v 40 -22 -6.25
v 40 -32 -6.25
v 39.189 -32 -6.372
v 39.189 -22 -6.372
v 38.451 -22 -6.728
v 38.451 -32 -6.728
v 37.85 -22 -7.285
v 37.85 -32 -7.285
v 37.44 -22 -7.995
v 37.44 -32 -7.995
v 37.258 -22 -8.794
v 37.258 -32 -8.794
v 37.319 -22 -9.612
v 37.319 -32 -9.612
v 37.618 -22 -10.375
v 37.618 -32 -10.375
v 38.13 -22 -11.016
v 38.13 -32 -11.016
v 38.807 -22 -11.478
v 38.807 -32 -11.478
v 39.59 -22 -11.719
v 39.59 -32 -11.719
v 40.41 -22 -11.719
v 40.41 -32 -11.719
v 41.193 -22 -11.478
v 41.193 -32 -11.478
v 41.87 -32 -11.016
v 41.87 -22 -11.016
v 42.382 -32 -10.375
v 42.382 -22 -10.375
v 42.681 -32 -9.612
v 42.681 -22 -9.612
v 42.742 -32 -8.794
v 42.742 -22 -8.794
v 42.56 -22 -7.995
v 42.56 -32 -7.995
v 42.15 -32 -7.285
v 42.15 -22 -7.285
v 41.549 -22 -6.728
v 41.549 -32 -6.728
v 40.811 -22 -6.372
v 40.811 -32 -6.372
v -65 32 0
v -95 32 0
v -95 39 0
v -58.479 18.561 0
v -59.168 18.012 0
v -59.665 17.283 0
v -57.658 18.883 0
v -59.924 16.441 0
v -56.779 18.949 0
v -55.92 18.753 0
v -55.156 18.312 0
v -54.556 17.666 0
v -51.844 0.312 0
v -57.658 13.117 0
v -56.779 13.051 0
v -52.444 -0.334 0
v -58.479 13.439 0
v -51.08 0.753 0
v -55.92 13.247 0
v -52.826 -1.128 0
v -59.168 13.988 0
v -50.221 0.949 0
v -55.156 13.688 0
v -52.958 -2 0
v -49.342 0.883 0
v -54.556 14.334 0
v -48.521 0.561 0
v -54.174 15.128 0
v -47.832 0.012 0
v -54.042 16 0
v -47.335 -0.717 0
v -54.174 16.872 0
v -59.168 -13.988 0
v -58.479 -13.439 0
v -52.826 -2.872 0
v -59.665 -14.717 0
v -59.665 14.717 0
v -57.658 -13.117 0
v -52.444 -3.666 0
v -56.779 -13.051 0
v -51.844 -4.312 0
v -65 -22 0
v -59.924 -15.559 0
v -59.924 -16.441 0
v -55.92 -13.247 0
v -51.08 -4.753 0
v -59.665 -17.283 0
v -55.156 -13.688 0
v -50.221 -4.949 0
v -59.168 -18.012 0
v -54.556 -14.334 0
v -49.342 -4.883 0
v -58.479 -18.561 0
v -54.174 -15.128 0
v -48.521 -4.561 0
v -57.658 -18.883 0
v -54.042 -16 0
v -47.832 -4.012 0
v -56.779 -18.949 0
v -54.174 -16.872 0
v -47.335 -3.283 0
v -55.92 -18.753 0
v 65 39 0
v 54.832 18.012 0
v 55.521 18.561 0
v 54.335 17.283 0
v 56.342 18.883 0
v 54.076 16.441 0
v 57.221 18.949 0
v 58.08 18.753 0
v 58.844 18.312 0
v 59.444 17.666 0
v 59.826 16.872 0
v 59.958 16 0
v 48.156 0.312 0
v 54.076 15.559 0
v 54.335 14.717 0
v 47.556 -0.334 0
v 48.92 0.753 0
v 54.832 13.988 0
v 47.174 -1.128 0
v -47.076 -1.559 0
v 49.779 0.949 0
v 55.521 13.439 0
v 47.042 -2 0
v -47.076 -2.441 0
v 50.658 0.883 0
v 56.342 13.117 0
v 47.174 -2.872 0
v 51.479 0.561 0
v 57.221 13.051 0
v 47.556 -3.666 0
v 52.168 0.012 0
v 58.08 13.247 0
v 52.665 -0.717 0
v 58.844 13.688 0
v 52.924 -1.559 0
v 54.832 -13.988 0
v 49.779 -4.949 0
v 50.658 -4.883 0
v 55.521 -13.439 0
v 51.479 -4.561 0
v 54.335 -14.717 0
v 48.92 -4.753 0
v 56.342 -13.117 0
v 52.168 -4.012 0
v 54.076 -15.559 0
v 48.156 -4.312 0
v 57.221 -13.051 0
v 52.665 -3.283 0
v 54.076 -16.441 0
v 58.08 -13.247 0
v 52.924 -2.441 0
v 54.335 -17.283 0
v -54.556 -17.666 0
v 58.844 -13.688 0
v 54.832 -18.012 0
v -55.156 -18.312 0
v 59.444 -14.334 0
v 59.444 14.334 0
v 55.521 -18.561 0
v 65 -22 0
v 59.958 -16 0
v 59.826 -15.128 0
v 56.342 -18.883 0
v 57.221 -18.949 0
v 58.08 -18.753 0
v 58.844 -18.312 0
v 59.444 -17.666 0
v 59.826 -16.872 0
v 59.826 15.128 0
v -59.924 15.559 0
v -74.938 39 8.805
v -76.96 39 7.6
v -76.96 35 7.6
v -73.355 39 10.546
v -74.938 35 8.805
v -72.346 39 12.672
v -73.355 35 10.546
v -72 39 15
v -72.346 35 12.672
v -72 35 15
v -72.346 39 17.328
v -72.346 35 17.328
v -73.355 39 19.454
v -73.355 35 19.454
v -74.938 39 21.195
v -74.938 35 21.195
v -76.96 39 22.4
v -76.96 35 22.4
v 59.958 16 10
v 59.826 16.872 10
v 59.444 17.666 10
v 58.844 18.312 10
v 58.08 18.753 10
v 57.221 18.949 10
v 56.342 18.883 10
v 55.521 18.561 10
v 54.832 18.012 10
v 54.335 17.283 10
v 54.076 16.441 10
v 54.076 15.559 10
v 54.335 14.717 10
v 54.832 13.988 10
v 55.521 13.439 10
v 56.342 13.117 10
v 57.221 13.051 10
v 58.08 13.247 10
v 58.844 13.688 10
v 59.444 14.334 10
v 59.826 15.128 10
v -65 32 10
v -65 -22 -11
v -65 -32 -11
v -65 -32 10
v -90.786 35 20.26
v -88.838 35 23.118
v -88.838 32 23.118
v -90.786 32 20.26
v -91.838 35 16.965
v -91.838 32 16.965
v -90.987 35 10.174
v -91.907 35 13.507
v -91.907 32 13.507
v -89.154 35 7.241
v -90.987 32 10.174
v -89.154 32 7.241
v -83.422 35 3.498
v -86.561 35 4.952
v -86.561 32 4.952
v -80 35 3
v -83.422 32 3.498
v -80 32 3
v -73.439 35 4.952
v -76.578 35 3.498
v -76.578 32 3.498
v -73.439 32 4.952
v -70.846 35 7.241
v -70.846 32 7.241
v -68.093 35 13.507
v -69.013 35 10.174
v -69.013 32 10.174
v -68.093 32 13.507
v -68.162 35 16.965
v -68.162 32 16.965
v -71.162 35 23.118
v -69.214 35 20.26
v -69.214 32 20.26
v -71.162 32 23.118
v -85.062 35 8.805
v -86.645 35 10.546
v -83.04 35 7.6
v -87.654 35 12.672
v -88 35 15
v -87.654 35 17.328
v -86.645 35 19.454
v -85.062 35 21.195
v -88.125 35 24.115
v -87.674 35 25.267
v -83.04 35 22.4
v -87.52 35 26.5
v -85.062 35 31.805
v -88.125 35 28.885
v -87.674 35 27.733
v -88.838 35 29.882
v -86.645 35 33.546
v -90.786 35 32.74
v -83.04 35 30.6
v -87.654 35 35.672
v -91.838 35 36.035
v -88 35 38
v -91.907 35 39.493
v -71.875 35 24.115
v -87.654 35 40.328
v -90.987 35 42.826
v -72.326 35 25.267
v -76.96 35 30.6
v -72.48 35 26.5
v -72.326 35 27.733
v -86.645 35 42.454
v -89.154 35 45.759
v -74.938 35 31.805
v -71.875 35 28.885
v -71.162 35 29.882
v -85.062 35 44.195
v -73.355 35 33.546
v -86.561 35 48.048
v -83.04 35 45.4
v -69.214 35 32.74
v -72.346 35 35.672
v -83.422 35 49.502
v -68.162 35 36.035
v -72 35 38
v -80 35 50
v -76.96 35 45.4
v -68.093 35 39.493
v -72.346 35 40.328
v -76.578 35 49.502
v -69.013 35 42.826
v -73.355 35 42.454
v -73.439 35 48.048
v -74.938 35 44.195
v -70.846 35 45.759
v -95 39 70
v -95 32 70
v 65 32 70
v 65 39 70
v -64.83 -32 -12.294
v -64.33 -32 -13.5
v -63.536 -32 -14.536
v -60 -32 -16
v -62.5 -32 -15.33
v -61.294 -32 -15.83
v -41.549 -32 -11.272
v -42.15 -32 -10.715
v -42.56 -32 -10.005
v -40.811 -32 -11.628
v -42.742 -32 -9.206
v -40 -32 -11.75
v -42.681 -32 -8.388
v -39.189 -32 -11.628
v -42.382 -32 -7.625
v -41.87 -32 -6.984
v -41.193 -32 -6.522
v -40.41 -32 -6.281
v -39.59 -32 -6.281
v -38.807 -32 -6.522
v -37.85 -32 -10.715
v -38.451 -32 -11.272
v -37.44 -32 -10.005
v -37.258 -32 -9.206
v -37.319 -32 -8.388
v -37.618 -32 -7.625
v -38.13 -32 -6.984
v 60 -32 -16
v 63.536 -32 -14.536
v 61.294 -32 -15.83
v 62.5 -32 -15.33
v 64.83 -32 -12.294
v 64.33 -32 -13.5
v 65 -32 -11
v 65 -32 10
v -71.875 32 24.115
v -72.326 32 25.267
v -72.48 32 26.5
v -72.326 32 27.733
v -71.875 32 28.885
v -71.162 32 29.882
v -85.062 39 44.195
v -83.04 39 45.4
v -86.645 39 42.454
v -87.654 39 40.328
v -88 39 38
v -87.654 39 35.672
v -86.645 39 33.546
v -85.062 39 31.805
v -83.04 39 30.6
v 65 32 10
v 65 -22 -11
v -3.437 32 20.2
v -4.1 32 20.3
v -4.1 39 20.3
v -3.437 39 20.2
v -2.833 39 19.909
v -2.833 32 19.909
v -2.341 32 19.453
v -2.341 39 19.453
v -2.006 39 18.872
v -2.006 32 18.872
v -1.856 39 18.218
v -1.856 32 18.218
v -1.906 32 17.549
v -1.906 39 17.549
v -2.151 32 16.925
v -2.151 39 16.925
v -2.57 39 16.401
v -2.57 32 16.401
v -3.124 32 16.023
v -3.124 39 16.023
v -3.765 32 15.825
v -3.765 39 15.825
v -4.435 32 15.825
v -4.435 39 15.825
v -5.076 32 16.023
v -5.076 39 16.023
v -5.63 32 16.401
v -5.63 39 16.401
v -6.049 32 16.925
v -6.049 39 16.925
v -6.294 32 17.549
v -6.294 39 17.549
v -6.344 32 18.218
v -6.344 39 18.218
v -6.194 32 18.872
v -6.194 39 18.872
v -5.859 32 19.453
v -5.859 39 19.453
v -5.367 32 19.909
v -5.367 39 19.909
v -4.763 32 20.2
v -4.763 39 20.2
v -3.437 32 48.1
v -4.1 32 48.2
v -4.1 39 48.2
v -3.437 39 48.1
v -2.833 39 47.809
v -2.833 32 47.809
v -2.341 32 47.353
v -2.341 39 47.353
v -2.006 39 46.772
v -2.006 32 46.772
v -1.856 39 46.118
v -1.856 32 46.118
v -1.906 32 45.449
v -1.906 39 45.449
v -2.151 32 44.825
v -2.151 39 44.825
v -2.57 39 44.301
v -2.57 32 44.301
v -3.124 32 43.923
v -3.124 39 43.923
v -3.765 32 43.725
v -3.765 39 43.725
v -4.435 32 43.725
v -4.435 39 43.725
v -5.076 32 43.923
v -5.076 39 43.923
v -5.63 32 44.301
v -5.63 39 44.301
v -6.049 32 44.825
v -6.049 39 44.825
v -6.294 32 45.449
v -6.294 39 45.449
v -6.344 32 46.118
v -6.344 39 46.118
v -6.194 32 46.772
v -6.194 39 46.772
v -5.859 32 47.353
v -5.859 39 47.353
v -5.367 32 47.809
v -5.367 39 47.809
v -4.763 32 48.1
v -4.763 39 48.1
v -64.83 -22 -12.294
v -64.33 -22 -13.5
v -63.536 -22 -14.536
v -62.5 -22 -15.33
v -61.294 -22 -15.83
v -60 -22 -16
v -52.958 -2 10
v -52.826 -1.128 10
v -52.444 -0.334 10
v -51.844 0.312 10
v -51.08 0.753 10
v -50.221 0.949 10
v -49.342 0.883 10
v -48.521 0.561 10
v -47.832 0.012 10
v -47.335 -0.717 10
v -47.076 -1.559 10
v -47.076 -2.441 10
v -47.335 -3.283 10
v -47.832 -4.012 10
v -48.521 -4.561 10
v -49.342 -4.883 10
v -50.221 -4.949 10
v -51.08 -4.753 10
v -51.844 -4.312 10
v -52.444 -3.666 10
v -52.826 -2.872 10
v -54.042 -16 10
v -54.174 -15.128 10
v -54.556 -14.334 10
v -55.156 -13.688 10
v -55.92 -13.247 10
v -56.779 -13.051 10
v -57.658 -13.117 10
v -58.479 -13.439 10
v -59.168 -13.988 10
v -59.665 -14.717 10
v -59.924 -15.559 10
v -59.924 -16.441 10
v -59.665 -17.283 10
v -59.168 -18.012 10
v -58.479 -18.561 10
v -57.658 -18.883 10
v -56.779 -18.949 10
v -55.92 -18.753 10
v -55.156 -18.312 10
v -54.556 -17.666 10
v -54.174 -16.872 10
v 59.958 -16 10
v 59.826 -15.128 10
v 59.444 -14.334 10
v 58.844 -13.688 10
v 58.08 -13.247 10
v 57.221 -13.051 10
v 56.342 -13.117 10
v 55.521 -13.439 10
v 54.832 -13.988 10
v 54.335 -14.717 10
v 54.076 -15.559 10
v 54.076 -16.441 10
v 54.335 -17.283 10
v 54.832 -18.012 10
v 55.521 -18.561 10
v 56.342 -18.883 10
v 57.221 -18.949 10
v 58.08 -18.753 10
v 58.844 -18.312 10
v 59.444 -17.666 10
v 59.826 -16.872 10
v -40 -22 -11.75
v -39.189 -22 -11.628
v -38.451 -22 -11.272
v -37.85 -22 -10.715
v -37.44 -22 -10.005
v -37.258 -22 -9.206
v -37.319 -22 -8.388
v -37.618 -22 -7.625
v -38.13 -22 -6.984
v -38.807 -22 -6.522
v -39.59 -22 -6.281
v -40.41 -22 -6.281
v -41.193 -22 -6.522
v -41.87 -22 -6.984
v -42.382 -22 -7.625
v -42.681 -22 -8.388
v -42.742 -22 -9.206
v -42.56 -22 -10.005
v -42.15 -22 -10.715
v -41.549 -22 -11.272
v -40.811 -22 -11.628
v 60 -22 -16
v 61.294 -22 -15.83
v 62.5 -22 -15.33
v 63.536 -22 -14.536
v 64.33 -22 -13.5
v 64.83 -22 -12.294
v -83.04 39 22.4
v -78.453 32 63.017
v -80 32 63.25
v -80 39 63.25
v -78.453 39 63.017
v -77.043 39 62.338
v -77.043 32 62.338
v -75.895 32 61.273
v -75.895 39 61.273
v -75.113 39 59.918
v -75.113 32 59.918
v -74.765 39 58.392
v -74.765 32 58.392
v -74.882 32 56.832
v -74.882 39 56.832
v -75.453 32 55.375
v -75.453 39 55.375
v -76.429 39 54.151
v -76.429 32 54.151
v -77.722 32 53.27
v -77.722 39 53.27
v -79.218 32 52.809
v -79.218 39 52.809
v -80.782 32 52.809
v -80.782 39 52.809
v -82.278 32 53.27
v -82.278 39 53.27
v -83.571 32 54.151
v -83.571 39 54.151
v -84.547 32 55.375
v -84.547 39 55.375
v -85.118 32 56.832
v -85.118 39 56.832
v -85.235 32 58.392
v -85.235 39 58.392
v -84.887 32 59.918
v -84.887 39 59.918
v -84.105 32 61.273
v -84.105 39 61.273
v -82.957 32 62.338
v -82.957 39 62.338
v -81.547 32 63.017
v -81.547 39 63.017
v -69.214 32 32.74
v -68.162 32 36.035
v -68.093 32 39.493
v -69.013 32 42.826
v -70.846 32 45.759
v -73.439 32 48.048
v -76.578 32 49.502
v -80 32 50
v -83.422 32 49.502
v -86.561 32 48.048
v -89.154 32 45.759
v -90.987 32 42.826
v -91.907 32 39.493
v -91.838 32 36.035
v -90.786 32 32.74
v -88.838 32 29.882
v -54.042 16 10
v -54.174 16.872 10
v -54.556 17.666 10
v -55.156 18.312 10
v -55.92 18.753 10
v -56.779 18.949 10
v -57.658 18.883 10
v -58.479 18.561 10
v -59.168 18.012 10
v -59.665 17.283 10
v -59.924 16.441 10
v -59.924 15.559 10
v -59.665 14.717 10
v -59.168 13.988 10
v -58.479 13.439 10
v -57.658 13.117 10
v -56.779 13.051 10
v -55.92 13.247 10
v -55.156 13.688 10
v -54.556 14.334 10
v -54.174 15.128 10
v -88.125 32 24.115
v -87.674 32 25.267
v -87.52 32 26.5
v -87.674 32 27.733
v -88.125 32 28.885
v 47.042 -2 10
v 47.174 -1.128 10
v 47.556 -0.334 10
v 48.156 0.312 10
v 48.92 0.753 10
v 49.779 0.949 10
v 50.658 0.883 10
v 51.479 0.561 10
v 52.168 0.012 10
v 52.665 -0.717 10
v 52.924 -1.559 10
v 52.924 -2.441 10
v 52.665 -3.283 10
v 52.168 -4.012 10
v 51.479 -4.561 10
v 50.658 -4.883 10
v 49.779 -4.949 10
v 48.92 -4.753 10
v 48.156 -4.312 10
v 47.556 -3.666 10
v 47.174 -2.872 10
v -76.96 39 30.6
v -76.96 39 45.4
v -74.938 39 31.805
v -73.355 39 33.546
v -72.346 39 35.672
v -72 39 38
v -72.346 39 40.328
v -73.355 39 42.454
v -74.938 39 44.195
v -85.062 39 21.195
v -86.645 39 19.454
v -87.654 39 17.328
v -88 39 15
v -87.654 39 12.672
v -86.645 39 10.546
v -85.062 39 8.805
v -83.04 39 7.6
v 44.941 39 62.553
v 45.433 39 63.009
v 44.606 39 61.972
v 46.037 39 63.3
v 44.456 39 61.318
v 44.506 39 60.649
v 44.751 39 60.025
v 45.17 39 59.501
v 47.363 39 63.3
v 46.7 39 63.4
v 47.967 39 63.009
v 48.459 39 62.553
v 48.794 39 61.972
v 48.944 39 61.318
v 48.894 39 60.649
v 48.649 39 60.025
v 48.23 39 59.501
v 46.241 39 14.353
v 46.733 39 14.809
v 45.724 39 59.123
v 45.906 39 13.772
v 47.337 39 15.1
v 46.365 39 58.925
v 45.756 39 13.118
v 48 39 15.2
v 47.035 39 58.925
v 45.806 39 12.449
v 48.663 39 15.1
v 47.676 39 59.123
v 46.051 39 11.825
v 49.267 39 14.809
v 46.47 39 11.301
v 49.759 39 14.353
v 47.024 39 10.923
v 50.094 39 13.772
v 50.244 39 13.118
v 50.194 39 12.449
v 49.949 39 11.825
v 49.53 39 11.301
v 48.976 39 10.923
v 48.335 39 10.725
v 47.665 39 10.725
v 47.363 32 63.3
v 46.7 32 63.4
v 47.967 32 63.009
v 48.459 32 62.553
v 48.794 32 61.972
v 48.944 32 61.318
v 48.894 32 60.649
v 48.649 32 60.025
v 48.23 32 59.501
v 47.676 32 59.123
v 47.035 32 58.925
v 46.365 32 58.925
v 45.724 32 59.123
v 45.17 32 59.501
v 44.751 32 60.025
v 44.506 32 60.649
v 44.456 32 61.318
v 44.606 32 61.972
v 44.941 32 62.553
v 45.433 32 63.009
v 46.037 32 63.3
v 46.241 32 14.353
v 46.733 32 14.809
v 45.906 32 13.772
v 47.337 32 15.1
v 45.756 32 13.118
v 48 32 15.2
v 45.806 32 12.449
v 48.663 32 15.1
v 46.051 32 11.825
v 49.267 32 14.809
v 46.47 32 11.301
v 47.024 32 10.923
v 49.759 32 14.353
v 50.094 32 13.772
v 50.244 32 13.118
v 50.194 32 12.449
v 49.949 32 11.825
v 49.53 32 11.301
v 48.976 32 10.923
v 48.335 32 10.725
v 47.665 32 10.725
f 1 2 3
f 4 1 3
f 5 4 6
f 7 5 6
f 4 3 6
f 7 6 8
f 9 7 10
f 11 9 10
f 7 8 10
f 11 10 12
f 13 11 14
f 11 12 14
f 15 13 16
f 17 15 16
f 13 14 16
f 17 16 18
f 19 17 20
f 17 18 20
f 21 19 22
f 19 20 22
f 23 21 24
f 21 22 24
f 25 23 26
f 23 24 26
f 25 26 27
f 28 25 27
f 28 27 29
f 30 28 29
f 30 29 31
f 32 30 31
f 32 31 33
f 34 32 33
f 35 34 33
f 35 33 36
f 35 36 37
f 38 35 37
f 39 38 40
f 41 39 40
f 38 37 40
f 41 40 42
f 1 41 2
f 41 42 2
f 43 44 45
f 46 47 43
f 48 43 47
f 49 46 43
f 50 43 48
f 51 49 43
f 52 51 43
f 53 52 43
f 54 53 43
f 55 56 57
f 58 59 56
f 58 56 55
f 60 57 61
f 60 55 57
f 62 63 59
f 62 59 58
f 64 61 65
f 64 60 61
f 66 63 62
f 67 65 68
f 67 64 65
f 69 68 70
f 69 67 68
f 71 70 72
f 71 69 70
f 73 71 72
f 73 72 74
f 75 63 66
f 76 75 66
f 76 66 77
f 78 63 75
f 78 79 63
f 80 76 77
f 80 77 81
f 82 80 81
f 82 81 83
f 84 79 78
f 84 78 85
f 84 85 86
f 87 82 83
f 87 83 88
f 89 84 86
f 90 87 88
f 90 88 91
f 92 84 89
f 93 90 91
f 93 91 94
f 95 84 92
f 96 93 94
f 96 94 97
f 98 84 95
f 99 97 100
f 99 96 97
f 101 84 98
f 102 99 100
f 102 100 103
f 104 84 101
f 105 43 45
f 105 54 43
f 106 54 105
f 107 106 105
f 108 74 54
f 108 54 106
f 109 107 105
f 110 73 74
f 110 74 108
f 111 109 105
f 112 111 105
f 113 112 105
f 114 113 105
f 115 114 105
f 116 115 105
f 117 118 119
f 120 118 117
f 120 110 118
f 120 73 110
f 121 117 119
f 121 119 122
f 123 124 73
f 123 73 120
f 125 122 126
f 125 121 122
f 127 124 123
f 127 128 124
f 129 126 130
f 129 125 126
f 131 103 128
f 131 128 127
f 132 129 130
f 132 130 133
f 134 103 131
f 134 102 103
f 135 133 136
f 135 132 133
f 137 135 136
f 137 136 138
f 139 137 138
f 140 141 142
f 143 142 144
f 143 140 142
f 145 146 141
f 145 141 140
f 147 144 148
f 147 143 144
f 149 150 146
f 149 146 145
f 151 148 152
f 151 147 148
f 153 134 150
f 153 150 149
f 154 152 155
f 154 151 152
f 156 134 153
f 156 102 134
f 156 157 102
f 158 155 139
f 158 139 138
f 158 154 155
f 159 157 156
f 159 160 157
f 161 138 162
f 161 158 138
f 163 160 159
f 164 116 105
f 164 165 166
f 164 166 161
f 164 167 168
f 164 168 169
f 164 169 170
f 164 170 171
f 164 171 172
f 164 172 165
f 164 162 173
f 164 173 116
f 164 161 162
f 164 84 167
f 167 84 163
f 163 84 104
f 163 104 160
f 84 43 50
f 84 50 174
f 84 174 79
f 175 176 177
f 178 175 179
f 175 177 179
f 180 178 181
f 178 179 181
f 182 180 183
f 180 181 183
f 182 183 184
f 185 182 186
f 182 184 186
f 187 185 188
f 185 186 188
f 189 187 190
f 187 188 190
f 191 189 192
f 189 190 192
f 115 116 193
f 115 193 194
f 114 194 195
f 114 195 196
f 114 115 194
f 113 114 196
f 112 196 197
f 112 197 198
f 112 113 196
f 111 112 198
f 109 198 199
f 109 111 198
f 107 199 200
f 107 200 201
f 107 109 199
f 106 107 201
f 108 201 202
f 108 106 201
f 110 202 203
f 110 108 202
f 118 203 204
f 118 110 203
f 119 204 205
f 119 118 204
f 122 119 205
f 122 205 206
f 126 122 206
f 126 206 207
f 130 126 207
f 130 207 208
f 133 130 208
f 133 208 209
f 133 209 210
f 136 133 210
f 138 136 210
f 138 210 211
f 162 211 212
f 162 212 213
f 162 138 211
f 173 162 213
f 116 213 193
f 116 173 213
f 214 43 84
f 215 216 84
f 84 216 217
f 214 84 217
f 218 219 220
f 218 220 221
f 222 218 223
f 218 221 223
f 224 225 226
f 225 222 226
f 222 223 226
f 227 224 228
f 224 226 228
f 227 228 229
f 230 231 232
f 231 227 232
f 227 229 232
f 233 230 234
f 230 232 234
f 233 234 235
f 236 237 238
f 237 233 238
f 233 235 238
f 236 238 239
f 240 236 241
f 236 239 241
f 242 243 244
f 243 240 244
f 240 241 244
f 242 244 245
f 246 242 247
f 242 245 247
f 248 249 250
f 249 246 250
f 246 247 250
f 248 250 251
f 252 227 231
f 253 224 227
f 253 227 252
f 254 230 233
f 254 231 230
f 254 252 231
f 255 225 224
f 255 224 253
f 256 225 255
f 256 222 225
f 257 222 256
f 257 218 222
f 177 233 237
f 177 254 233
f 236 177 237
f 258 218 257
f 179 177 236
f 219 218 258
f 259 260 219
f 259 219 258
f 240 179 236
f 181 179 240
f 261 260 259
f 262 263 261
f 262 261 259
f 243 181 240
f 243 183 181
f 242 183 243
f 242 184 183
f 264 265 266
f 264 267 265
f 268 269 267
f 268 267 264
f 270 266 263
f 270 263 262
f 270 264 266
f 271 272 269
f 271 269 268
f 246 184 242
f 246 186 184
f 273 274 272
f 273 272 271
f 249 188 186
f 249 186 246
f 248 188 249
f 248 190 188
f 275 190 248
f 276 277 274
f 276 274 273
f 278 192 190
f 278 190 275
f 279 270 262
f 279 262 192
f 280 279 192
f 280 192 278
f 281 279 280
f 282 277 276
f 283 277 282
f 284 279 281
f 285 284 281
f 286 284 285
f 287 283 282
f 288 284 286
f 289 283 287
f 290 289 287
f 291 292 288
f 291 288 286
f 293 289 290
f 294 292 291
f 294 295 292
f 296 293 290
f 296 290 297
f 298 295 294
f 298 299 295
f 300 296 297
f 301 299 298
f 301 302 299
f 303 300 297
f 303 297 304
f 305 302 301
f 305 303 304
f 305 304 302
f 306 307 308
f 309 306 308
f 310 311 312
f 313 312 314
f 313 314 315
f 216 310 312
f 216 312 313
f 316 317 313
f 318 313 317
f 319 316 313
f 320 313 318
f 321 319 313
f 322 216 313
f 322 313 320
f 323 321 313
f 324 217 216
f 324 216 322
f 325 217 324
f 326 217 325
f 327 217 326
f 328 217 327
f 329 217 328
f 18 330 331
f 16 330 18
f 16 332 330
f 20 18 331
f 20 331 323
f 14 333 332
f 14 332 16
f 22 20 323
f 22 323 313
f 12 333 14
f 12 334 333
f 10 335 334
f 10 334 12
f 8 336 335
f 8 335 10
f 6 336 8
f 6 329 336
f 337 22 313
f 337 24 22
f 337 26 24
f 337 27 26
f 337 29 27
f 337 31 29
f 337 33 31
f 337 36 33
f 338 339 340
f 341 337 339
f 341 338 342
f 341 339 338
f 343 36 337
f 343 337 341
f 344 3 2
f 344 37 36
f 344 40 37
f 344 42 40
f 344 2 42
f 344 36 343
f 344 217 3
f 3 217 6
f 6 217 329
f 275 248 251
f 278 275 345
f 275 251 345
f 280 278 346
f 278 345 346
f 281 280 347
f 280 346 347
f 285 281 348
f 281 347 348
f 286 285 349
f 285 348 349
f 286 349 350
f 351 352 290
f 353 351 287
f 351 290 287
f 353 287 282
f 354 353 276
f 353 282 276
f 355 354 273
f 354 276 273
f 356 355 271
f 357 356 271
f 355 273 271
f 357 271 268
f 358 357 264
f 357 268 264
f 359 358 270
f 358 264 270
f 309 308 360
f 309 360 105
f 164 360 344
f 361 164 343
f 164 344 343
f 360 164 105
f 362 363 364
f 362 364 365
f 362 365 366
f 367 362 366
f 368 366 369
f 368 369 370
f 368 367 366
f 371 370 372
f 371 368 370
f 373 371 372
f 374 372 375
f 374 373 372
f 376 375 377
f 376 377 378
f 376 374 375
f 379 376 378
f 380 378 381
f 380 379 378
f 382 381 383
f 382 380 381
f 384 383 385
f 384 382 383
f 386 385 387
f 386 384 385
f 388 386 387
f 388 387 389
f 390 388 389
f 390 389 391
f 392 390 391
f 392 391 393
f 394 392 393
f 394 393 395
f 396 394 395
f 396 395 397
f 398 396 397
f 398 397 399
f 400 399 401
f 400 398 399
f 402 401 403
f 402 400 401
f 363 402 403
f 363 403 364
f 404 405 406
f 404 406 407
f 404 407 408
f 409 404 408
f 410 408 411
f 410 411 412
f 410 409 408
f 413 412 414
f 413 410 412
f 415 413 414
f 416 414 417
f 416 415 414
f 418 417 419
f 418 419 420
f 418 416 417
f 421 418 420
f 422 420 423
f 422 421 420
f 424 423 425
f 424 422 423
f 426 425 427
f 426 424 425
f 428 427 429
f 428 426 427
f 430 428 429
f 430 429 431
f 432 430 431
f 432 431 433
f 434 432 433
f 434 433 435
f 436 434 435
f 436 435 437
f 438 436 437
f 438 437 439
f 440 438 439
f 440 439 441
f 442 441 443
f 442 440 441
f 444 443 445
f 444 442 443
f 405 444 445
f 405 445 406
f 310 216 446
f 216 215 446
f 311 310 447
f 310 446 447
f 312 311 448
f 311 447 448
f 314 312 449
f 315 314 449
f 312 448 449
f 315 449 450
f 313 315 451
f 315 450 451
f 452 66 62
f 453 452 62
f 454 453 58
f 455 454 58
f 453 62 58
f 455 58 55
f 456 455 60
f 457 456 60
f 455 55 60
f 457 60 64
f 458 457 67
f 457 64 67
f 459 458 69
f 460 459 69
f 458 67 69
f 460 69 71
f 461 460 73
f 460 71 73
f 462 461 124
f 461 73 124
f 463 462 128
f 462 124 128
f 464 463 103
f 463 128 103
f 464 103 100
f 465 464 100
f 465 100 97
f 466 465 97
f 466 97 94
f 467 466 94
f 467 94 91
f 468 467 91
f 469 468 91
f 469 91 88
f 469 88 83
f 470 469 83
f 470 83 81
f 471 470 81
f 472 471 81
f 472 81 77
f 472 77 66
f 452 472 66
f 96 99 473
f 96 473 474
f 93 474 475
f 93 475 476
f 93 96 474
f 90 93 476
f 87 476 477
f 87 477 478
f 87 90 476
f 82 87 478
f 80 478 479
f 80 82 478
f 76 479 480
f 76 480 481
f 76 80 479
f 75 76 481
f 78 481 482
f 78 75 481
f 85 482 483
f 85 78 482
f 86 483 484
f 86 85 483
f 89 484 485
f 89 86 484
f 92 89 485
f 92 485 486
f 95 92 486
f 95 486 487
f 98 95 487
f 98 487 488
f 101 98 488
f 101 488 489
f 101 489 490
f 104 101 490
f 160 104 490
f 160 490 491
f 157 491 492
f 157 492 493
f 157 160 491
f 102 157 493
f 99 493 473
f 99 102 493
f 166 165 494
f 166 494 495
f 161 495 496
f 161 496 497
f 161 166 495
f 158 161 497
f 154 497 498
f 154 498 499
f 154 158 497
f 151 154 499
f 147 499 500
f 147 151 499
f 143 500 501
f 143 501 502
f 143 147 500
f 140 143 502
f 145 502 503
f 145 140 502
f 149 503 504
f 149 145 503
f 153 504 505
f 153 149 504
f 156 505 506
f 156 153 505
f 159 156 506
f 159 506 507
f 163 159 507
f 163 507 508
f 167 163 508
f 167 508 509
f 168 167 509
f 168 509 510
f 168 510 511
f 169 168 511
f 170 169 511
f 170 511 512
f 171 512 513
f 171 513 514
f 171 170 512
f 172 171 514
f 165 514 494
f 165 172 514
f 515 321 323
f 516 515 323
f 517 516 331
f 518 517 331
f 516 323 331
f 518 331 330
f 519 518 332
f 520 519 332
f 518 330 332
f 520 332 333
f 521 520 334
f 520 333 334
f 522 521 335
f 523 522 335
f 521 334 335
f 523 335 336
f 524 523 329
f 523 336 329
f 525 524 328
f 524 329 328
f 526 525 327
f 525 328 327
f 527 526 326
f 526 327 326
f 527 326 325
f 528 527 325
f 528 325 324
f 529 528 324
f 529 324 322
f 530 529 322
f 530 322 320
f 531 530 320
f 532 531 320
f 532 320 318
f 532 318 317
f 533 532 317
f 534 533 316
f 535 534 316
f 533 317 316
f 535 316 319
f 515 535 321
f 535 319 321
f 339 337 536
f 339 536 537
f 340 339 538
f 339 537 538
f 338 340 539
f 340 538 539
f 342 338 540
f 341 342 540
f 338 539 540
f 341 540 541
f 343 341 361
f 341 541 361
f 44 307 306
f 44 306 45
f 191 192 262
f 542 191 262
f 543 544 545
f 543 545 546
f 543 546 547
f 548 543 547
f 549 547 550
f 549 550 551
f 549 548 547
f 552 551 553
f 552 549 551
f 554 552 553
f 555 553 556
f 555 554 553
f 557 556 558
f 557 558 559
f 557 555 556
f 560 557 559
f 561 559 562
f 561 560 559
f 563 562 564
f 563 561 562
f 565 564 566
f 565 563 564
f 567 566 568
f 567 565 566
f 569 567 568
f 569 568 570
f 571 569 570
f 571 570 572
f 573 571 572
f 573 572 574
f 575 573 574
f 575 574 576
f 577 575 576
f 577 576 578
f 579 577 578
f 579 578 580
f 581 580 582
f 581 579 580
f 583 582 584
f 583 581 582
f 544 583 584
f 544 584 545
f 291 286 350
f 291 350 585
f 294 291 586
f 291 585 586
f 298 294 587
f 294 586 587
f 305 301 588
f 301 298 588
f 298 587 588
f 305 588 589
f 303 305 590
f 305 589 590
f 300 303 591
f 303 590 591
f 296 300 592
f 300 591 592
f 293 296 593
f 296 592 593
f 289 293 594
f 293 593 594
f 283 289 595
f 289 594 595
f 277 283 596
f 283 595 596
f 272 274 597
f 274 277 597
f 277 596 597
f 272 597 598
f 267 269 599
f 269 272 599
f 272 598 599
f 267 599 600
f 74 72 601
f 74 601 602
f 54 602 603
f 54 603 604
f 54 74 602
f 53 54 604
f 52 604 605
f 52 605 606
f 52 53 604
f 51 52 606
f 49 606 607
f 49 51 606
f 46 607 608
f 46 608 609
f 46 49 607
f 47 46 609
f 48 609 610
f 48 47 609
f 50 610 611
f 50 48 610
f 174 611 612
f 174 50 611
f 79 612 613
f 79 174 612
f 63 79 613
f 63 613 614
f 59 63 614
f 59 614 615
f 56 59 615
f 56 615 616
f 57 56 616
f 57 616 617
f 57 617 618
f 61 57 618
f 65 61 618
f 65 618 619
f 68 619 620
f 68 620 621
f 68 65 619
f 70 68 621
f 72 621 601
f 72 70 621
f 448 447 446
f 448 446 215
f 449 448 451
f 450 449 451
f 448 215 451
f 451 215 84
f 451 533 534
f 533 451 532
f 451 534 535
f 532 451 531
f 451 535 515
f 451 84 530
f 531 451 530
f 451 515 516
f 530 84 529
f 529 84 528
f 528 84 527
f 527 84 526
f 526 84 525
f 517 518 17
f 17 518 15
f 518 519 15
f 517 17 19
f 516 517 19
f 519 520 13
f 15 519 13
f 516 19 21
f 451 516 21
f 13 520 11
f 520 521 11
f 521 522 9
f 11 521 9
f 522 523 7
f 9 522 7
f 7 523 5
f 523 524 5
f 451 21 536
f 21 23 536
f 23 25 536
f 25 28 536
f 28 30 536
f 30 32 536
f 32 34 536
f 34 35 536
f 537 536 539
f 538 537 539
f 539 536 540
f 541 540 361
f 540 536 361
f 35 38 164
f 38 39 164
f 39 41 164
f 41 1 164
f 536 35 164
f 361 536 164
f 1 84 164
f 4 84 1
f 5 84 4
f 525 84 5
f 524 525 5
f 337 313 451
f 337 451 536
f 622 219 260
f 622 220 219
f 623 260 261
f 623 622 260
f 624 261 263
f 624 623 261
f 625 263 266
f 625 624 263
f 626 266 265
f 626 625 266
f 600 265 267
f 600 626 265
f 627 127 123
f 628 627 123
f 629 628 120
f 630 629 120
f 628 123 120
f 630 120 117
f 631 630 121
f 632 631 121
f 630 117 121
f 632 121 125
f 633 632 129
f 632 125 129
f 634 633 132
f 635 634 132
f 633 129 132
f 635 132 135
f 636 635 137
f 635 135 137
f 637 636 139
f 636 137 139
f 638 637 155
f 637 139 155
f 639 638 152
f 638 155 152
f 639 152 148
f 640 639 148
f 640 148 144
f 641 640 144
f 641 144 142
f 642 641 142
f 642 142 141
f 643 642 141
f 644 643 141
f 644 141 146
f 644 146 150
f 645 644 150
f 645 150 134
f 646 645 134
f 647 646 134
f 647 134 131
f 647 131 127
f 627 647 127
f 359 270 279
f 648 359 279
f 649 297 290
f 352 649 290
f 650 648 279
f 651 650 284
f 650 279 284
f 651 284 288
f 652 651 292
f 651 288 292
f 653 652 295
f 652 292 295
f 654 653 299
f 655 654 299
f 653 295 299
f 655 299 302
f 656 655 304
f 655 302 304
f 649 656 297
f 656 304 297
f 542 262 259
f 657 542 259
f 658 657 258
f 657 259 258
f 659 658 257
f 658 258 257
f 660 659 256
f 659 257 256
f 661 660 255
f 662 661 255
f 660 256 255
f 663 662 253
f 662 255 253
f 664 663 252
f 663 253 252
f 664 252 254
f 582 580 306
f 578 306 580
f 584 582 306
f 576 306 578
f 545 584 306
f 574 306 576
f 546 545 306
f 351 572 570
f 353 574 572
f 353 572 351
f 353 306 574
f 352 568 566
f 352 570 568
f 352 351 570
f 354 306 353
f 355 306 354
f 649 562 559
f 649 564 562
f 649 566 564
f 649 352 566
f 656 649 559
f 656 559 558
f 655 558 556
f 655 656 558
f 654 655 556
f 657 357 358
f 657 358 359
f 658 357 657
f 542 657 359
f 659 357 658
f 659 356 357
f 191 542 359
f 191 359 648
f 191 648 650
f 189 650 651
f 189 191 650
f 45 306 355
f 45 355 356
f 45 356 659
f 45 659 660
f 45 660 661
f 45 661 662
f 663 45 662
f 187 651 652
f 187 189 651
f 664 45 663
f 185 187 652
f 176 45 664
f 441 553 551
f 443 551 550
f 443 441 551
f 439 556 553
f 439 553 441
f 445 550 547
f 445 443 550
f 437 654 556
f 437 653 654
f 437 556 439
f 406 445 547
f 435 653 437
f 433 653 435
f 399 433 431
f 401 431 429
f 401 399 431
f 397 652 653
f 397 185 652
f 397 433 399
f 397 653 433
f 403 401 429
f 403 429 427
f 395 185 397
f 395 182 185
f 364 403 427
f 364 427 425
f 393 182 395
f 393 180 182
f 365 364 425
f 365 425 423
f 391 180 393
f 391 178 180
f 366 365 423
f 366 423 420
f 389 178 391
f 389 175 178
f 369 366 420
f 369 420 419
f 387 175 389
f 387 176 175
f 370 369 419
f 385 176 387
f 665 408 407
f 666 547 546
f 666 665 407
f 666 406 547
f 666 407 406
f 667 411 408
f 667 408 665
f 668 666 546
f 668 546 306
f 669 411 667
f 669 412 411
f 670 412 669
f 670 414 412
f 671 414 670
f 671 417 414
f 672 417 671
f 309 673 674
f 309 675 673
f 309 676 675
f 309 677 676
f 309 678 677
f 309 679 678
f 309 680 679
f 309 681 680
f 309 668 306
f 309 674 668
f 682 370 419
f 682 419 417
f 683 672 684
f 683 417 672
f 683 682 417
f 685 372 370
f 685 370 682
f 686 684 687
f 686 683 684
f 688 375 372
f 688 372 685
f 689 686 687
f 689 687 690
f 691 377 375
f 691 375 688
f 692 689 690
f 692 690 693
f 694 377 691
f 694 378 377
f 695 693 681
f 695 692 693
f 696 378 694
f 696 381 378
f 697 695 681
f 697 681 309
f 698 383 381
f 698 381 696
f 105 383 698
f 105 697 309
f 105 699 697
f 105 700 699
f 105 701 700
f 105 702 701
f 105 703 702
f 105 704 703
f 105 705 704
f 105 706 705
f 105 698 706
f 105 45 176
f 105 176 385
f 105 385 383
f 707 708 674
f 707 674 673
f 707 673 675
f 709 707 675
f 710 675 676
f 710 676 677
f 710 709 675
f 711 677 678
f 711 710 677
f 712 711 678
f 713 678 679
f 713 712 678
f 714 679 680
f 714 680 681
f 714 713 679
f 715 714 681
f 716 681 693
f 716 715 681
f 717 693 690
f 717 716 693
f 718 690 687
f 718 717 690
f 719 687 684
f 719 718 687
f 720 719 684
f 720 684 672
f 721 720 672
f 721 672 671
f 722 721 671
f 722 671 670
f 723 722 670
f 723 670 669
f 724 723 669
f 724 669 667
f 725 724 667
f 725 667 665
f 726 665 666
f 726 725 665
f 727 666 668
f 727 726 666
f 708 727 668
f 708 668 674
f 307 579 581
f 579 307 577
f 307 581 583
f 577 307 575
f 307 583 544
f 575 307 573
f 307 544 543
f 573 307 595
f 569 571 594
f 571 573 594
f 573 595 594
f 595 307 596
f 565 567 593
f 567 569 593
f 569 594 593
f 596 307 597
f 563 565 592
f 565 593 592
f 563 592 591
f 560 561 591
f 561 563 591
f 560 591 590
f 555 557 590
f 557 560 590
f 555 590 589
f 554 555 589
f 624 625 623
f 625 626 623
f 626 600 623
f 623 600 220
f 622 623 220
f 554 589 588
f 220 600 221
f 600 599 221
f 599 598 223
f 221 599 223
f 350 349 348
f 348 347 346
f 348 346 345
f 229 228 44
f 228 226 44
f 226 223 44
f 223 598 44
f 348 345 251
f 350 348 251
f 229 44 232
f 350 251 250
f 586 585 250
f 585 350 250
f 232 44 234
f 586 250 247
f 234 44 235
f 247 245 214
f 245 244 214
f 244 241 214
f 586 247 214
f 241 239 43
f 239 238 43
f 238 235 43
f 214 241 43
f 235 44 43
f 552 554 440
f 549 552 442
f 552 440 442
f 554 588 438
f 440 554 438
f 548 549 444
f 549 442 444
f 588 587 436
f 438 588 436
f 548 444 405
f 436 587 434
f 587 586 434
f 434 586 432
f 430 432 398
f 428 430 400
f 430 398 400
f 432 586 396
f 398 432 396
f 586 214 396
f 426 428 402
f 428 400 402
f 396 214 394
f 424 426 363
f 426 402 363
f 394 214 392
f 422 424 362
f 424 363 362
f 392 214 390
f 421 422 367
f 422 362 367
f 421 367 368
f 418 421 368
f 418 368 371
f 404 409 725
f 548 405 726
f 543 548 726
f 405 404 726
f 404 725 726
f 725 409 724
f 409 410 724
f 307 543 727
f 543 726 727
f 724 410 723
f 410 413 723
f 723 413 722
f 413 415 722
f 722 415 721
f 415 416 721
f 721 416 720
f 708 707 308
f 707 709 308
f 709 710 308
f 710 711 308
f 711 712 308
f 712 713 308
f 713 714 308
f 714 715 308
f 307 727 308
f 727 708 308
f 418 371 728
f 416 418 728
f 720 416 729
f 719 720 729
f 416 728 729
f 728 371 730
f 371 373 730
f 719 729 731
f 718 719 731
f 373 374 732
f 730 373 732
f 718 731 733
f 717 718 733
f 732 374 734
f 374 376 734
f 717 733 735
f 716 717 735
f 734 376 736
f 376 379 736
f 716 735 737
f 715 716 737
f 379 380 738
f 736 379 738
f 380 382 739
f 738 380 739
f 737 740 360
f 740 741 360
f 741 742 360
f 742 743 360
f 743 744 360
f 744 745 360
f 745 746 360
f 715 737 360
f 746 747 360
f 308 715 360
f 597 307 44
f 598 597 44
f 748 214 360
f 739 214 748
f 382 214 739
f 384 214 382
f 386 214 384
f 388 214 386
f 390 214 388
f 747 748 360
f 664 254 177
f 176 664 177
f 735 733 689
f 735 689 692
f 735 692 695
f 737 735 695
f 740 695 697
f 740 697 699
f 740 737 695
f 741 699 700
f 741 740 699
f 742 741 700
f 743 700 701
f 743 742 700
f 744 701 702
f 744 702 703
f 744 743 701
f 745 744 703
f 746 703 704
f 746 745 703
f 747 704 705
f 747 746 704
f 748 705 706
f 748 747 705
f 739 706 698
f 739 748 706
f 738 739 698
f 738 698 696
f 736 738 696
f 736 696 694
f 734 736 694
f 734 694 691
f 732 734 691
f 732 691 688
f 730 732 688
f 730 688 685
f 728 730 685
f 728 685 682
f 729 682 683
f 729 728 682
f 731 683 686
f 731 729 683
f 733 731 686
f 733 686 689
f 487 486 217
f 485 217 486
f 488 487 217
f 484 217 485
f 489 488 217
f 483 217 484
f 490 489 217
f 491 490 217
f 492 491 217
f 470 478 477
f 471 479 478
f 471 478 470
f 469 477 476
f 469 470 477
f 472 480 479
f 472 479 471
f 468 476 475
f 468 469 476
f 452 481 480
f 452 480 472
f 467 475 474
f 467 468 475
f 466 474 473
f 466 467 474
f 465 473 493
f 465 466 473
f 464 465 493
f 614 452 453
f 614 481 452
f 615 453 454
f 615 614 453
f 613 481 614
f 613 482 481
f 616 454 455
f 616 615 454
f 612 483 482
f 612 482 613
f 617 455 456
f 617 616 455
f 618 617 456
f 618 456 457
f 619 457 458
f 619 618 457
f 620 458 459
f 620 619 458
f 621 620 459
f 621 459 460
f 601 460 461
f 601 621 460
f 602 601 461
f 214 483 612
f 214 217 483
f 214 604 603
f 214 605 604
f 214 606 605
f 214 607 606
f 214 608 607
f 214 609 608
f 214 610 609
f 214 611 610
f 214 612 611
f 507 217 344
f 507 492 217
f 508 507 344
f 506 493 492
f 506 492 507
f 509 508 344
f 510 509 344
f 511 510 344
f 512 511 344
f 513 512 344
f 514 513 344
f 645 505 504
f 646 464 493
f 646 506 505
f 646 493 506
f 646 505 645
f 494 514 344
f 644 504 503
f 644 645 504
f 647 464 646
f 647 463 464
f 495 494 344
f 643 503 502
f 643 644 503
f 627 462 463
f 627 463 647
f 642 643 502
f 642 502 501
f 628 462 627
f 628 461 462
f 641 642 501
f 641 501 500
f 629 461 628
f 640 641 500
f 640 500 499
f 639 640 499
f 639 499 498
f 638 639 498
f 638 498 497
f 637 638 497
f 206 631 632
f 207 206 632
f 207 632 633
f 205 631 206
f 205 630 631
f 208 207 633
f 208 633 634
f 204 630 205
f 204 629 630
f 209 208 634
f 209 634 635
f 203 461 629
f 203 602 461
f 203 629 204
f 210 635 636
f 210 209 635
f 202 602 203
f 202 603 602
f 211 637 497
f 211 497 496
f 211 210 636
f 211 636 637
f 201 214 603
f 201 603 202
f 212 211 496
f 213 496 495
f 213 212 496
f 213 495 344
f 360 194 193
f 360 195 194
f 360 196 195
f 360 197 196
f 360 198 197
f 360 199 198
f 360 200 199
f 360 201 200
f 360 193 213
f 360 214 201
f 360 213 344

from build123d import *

# Parameters (mm, degrees)
SKETCH1_W           = 130
SKETCH1_H           = 64
SKETCH1_R           = 2.9575
BOSS_EXTRUDE1_DEPTH = 10
SKETCH2_W           = 130
SKETCH2_H           = 16
SKETCH2_R           = 2.75
BOSS_EXTRUDE2_DEPTH = 10
SKETCH3_W           = 160
SKETCH3_H           = 70
SKETCH3_R           = 2.25
SKETCH3_R_2         = 5.25
BOSS_EXTRUDE3_DEPTH = 7
SKETCH4_R           = 12
CUT_EXTRUDE1_DEPTH  = 3
FILLET1_R           = 5
CUT_EXTRUDE2_REACH  = 126.282
SKETCH5_R           = 2.9575
FILLET2_R           = 5
FILLET3_R           = 5


with BuildPart() as part:
    # Sketch1 → Boss-Extrude1 (new body)
    with BuildSketch(Plane.XY):
        Rectangle(SKETCH1_W, SKETCH1_H)
        with Locations((57, 16)):
            Circle(SKETCH1_R, mode=Mode.SUBTRACT)
        with Locations((57, -16)):
            Circle(SKETCH1_R, mode=Mode.SUBTRACT)
        with Locations((-57, -16)):
            Circle(SKETCH1_R, mode=Mode.SUBTRACT)
        with Locations((-57, 16)):
            Circle(SKETCH1_R, mode=Mode.SUBTRACT)
    extrude(amount=BOSS_EXTRUDE1_DEPTH)

    # Sketch2 → Boss-Extrude2 (add)
    with BuildSketch(Plane.XZ.offset(32)):
        with Locations((0, -8)):
            Rectangle(SKETCH2_W, SKETCH2_H)
        with Locations(Location((-40, -9, 0), (0, 0, 270))):
            Circle(SKETCH2_R, mode=Mode.SUBTRACT)
        with Locations(Location((40, -9, 0), (0, 0, 90))):
            Circle(SKETCH2_R, mode=Mode.SUBTRACT)
    extrude(amount=-BOSS_EXTRUDE2_DEPTH)

    # Sketch3 → Boss-Extrude3 (add)
    with BuildSketch(Plane(origin=(0, 32, 0), x_dir=(1, 0, 0), z_dir=(0, 1, 0))):
        with Locations((-15, -35)):
            Rectangle(SKETCH3_W, SKETCH3_H)
        with Locations(Location((48, -12.95, 0), (0, 0, 270))):
            Circle(SKETCH3_R, mode=Mode.SUBTRACT)
        with Locations(Location((-4.1, -18.05, 0), (0, 0, 270))):
            Circle(SKETCH3_R, mode=Mode.SUBTRACT)
        with Locations(Location((-4.1, -45.95, 0), (0, 0, 270))):
            Circle(SKETCH3_R, mode=Mode.SUBTRACT)
        with Locations(Location((46.7, -61.15, 0), (0, 0, 270))):
            Circle(SKETCH3_R, mode=Mode.SUBTRACT)
        with Locations(Location((-80, -58, 0), (0, 0, 270))):
            Circle(SKETCH3_R_2, mode=Mode.SUBTRACT)
        with BuildLine():
            Line((-83.039736831, -30.6), (-76.960263169, -30.6))
            ThreePointArc((-76.960263169, -30.6), (-72, -38), (-76.960263169, -45.4))
            Line((-76.960263169, -45.4), (-83.039736831, -45.4))
            ThreePointArc((-83.039736831, -45.4), (-88, -38), (-83.039736831, -30.6))
        make_face(mode=Mode.SUBTRACT)
        with BuildLine():
            Line((-83.039736831, -7.6), (-76.960263169, -7.6))
            ThreePointArc((-76.960263169, -7.6), (-72, -15), (-76.960263169, -22.4))
            Line((-76.960263169, -22.4), (-83.039736831, -22.4))
            ThreePointArc((-83.039736831, -22.4), (-88, -15), (-83.039736831, -7.6))
        make_face(mode=Mode.SUBTRACT)
    extrude(amount=BOSS_EXTRUDE3_DEPTH)

    # Sketch4 → Cut-Extrude1 (cut)
    # profile 1 of 6: a face of its own
    with BuildSketch(Plane.XZ.offset(-32)):
        with Locations((-80, 38)):
            Circle(SKETCH4_R)
    # profile 2 of 6: a face of its own
    with BuildSketch(Plane.XZ.offset(-32)):
        with Locations((-80, 15)):
            Circle(SKETCH4_R)
        with BuildLine():
            Line((-76.960263169, 7.6), (-83.039736831, 7.6))
            ThreePointArc((-83.039736831, 7.6), (-88, 15), (-83.039736831, 22.4))
            Line((-83.039736831, 22.4), (-76.960263169, 22.4))
            ThreePointArc((-76.960263169, 22.4), (-72, 15), (-76.960263169, 7.6))
        make_face(mode=Mode.SUBTRACT)
    # profile 3 of 6: a face of its own
    with BuildSketch(Plane.XZ.offset(-32)):
        with Locations((-80, 15)):
            Circle(SKETCH4_R)
    # profile 4 of 6: a face of its own
    with BuildSketch(Plane.XZ.offset(-32)):
        with Locations((-80, 38)):
            Circle(SKETCH4_R)
        with BuildLine():
            Line((-76.960263169, 30.6), (-83.039736831, 30.6))
            ThreePointArc((-83.039736831, 30.6), (-88, 38), (-83.039736831, 45.4))
            Line((-83.039736831, 45.4), (-76.960263169, 45.4))
            ThreePointArc((-76.960263169, 45.4), (-72, 38), (-76.960263169, 30.6))
        make_face(mode=Mode.SUBTRACT)
    # profile 5 of 6: a face of its own
    with BuildSketch(Plane.XZ.offset(-32)):
        with Locations((-80, 38)):
            Circle(SKETCH4_R)
    # profile 6 of 6: a face of its own
    with BuildSketch(Plane.XZ.offset(-32)):
        with Locations((-80, 15)):
            Circle(SKETCH4_R)
    extrude(amount=-CUT_EXTRUDE1_DEPTH, mode=Mode.SUBTRACT)

    # Fillet1
    fillet1_edges = [part.edges().sort_by_distance(p)[0] for p in [
        (-83.4278273, 33.5, 26.5),
        (-76.5721727, 33.5, 26.5),
    ]]
    fillet(fillet1_edges, radius=FILLET1_R)

    # Sketch5 → Cut-Extrude2 (cut, up to next)
    with BuildSketch(Plane(origin=(0, 0, 0), x_dir=(-1, 0, 0), z_dir=(0, 0, -1)), mode=Mode.PRIVATE) as cut_extrude2_sk1:
        with Locations((-50, -2)):
            Circle(SKETCH5_R)
    cut_extrude2_tool1 = extrude(cut_extrude2_sk1.sketch, amount=-CUT_EXTRUDE2_REACH, mode=Mode.PRIVATE) & part.part
    # Sketch5 → Cut-Extrude2 (cut, up to next)
    with BuildSketch(Plane(origin=(0, 0, 0), x_dir=(-1, 0, 0), z_dir=(0, 0, -1)), mode=Mode.PRIVATE) as cut_extrude2_sk2:
        with Locations((50, -2)):
            Circle(SKETCH5_R)
    cut_extrude2_tool2 = extrude(cut_extrude2_sk2.sketch, amount=-CUT_EXTRUDE2_REACH, mode=Mode.PRIVATE) & part.part
    add(cut_extrude2_tool1.solids().sort_by_distance((50, -2, 0))[0], mode=Mode.SUBTRACT)
    add(cut_extrude2_tool2.solids().sort_by_distance((-50, -2, 0))[0], mode=Mode.SUBTRACT)

    # Fillet2
    fillet2_edges = [part.edges().sort_by_distance(p)[0] for p in [
        (-65, -27, -16),
    ]]
    fillet(fillet2_edges, radius=FILLET2_R)

    # Fillet3
    fillet3_edges = [part.edges().sort_by_distance(p)[0] for p in [
        (65, -27, -16),
    ]]
    fillet(fillet3_edges, radius=FILLET3_R)


solid = part.part
